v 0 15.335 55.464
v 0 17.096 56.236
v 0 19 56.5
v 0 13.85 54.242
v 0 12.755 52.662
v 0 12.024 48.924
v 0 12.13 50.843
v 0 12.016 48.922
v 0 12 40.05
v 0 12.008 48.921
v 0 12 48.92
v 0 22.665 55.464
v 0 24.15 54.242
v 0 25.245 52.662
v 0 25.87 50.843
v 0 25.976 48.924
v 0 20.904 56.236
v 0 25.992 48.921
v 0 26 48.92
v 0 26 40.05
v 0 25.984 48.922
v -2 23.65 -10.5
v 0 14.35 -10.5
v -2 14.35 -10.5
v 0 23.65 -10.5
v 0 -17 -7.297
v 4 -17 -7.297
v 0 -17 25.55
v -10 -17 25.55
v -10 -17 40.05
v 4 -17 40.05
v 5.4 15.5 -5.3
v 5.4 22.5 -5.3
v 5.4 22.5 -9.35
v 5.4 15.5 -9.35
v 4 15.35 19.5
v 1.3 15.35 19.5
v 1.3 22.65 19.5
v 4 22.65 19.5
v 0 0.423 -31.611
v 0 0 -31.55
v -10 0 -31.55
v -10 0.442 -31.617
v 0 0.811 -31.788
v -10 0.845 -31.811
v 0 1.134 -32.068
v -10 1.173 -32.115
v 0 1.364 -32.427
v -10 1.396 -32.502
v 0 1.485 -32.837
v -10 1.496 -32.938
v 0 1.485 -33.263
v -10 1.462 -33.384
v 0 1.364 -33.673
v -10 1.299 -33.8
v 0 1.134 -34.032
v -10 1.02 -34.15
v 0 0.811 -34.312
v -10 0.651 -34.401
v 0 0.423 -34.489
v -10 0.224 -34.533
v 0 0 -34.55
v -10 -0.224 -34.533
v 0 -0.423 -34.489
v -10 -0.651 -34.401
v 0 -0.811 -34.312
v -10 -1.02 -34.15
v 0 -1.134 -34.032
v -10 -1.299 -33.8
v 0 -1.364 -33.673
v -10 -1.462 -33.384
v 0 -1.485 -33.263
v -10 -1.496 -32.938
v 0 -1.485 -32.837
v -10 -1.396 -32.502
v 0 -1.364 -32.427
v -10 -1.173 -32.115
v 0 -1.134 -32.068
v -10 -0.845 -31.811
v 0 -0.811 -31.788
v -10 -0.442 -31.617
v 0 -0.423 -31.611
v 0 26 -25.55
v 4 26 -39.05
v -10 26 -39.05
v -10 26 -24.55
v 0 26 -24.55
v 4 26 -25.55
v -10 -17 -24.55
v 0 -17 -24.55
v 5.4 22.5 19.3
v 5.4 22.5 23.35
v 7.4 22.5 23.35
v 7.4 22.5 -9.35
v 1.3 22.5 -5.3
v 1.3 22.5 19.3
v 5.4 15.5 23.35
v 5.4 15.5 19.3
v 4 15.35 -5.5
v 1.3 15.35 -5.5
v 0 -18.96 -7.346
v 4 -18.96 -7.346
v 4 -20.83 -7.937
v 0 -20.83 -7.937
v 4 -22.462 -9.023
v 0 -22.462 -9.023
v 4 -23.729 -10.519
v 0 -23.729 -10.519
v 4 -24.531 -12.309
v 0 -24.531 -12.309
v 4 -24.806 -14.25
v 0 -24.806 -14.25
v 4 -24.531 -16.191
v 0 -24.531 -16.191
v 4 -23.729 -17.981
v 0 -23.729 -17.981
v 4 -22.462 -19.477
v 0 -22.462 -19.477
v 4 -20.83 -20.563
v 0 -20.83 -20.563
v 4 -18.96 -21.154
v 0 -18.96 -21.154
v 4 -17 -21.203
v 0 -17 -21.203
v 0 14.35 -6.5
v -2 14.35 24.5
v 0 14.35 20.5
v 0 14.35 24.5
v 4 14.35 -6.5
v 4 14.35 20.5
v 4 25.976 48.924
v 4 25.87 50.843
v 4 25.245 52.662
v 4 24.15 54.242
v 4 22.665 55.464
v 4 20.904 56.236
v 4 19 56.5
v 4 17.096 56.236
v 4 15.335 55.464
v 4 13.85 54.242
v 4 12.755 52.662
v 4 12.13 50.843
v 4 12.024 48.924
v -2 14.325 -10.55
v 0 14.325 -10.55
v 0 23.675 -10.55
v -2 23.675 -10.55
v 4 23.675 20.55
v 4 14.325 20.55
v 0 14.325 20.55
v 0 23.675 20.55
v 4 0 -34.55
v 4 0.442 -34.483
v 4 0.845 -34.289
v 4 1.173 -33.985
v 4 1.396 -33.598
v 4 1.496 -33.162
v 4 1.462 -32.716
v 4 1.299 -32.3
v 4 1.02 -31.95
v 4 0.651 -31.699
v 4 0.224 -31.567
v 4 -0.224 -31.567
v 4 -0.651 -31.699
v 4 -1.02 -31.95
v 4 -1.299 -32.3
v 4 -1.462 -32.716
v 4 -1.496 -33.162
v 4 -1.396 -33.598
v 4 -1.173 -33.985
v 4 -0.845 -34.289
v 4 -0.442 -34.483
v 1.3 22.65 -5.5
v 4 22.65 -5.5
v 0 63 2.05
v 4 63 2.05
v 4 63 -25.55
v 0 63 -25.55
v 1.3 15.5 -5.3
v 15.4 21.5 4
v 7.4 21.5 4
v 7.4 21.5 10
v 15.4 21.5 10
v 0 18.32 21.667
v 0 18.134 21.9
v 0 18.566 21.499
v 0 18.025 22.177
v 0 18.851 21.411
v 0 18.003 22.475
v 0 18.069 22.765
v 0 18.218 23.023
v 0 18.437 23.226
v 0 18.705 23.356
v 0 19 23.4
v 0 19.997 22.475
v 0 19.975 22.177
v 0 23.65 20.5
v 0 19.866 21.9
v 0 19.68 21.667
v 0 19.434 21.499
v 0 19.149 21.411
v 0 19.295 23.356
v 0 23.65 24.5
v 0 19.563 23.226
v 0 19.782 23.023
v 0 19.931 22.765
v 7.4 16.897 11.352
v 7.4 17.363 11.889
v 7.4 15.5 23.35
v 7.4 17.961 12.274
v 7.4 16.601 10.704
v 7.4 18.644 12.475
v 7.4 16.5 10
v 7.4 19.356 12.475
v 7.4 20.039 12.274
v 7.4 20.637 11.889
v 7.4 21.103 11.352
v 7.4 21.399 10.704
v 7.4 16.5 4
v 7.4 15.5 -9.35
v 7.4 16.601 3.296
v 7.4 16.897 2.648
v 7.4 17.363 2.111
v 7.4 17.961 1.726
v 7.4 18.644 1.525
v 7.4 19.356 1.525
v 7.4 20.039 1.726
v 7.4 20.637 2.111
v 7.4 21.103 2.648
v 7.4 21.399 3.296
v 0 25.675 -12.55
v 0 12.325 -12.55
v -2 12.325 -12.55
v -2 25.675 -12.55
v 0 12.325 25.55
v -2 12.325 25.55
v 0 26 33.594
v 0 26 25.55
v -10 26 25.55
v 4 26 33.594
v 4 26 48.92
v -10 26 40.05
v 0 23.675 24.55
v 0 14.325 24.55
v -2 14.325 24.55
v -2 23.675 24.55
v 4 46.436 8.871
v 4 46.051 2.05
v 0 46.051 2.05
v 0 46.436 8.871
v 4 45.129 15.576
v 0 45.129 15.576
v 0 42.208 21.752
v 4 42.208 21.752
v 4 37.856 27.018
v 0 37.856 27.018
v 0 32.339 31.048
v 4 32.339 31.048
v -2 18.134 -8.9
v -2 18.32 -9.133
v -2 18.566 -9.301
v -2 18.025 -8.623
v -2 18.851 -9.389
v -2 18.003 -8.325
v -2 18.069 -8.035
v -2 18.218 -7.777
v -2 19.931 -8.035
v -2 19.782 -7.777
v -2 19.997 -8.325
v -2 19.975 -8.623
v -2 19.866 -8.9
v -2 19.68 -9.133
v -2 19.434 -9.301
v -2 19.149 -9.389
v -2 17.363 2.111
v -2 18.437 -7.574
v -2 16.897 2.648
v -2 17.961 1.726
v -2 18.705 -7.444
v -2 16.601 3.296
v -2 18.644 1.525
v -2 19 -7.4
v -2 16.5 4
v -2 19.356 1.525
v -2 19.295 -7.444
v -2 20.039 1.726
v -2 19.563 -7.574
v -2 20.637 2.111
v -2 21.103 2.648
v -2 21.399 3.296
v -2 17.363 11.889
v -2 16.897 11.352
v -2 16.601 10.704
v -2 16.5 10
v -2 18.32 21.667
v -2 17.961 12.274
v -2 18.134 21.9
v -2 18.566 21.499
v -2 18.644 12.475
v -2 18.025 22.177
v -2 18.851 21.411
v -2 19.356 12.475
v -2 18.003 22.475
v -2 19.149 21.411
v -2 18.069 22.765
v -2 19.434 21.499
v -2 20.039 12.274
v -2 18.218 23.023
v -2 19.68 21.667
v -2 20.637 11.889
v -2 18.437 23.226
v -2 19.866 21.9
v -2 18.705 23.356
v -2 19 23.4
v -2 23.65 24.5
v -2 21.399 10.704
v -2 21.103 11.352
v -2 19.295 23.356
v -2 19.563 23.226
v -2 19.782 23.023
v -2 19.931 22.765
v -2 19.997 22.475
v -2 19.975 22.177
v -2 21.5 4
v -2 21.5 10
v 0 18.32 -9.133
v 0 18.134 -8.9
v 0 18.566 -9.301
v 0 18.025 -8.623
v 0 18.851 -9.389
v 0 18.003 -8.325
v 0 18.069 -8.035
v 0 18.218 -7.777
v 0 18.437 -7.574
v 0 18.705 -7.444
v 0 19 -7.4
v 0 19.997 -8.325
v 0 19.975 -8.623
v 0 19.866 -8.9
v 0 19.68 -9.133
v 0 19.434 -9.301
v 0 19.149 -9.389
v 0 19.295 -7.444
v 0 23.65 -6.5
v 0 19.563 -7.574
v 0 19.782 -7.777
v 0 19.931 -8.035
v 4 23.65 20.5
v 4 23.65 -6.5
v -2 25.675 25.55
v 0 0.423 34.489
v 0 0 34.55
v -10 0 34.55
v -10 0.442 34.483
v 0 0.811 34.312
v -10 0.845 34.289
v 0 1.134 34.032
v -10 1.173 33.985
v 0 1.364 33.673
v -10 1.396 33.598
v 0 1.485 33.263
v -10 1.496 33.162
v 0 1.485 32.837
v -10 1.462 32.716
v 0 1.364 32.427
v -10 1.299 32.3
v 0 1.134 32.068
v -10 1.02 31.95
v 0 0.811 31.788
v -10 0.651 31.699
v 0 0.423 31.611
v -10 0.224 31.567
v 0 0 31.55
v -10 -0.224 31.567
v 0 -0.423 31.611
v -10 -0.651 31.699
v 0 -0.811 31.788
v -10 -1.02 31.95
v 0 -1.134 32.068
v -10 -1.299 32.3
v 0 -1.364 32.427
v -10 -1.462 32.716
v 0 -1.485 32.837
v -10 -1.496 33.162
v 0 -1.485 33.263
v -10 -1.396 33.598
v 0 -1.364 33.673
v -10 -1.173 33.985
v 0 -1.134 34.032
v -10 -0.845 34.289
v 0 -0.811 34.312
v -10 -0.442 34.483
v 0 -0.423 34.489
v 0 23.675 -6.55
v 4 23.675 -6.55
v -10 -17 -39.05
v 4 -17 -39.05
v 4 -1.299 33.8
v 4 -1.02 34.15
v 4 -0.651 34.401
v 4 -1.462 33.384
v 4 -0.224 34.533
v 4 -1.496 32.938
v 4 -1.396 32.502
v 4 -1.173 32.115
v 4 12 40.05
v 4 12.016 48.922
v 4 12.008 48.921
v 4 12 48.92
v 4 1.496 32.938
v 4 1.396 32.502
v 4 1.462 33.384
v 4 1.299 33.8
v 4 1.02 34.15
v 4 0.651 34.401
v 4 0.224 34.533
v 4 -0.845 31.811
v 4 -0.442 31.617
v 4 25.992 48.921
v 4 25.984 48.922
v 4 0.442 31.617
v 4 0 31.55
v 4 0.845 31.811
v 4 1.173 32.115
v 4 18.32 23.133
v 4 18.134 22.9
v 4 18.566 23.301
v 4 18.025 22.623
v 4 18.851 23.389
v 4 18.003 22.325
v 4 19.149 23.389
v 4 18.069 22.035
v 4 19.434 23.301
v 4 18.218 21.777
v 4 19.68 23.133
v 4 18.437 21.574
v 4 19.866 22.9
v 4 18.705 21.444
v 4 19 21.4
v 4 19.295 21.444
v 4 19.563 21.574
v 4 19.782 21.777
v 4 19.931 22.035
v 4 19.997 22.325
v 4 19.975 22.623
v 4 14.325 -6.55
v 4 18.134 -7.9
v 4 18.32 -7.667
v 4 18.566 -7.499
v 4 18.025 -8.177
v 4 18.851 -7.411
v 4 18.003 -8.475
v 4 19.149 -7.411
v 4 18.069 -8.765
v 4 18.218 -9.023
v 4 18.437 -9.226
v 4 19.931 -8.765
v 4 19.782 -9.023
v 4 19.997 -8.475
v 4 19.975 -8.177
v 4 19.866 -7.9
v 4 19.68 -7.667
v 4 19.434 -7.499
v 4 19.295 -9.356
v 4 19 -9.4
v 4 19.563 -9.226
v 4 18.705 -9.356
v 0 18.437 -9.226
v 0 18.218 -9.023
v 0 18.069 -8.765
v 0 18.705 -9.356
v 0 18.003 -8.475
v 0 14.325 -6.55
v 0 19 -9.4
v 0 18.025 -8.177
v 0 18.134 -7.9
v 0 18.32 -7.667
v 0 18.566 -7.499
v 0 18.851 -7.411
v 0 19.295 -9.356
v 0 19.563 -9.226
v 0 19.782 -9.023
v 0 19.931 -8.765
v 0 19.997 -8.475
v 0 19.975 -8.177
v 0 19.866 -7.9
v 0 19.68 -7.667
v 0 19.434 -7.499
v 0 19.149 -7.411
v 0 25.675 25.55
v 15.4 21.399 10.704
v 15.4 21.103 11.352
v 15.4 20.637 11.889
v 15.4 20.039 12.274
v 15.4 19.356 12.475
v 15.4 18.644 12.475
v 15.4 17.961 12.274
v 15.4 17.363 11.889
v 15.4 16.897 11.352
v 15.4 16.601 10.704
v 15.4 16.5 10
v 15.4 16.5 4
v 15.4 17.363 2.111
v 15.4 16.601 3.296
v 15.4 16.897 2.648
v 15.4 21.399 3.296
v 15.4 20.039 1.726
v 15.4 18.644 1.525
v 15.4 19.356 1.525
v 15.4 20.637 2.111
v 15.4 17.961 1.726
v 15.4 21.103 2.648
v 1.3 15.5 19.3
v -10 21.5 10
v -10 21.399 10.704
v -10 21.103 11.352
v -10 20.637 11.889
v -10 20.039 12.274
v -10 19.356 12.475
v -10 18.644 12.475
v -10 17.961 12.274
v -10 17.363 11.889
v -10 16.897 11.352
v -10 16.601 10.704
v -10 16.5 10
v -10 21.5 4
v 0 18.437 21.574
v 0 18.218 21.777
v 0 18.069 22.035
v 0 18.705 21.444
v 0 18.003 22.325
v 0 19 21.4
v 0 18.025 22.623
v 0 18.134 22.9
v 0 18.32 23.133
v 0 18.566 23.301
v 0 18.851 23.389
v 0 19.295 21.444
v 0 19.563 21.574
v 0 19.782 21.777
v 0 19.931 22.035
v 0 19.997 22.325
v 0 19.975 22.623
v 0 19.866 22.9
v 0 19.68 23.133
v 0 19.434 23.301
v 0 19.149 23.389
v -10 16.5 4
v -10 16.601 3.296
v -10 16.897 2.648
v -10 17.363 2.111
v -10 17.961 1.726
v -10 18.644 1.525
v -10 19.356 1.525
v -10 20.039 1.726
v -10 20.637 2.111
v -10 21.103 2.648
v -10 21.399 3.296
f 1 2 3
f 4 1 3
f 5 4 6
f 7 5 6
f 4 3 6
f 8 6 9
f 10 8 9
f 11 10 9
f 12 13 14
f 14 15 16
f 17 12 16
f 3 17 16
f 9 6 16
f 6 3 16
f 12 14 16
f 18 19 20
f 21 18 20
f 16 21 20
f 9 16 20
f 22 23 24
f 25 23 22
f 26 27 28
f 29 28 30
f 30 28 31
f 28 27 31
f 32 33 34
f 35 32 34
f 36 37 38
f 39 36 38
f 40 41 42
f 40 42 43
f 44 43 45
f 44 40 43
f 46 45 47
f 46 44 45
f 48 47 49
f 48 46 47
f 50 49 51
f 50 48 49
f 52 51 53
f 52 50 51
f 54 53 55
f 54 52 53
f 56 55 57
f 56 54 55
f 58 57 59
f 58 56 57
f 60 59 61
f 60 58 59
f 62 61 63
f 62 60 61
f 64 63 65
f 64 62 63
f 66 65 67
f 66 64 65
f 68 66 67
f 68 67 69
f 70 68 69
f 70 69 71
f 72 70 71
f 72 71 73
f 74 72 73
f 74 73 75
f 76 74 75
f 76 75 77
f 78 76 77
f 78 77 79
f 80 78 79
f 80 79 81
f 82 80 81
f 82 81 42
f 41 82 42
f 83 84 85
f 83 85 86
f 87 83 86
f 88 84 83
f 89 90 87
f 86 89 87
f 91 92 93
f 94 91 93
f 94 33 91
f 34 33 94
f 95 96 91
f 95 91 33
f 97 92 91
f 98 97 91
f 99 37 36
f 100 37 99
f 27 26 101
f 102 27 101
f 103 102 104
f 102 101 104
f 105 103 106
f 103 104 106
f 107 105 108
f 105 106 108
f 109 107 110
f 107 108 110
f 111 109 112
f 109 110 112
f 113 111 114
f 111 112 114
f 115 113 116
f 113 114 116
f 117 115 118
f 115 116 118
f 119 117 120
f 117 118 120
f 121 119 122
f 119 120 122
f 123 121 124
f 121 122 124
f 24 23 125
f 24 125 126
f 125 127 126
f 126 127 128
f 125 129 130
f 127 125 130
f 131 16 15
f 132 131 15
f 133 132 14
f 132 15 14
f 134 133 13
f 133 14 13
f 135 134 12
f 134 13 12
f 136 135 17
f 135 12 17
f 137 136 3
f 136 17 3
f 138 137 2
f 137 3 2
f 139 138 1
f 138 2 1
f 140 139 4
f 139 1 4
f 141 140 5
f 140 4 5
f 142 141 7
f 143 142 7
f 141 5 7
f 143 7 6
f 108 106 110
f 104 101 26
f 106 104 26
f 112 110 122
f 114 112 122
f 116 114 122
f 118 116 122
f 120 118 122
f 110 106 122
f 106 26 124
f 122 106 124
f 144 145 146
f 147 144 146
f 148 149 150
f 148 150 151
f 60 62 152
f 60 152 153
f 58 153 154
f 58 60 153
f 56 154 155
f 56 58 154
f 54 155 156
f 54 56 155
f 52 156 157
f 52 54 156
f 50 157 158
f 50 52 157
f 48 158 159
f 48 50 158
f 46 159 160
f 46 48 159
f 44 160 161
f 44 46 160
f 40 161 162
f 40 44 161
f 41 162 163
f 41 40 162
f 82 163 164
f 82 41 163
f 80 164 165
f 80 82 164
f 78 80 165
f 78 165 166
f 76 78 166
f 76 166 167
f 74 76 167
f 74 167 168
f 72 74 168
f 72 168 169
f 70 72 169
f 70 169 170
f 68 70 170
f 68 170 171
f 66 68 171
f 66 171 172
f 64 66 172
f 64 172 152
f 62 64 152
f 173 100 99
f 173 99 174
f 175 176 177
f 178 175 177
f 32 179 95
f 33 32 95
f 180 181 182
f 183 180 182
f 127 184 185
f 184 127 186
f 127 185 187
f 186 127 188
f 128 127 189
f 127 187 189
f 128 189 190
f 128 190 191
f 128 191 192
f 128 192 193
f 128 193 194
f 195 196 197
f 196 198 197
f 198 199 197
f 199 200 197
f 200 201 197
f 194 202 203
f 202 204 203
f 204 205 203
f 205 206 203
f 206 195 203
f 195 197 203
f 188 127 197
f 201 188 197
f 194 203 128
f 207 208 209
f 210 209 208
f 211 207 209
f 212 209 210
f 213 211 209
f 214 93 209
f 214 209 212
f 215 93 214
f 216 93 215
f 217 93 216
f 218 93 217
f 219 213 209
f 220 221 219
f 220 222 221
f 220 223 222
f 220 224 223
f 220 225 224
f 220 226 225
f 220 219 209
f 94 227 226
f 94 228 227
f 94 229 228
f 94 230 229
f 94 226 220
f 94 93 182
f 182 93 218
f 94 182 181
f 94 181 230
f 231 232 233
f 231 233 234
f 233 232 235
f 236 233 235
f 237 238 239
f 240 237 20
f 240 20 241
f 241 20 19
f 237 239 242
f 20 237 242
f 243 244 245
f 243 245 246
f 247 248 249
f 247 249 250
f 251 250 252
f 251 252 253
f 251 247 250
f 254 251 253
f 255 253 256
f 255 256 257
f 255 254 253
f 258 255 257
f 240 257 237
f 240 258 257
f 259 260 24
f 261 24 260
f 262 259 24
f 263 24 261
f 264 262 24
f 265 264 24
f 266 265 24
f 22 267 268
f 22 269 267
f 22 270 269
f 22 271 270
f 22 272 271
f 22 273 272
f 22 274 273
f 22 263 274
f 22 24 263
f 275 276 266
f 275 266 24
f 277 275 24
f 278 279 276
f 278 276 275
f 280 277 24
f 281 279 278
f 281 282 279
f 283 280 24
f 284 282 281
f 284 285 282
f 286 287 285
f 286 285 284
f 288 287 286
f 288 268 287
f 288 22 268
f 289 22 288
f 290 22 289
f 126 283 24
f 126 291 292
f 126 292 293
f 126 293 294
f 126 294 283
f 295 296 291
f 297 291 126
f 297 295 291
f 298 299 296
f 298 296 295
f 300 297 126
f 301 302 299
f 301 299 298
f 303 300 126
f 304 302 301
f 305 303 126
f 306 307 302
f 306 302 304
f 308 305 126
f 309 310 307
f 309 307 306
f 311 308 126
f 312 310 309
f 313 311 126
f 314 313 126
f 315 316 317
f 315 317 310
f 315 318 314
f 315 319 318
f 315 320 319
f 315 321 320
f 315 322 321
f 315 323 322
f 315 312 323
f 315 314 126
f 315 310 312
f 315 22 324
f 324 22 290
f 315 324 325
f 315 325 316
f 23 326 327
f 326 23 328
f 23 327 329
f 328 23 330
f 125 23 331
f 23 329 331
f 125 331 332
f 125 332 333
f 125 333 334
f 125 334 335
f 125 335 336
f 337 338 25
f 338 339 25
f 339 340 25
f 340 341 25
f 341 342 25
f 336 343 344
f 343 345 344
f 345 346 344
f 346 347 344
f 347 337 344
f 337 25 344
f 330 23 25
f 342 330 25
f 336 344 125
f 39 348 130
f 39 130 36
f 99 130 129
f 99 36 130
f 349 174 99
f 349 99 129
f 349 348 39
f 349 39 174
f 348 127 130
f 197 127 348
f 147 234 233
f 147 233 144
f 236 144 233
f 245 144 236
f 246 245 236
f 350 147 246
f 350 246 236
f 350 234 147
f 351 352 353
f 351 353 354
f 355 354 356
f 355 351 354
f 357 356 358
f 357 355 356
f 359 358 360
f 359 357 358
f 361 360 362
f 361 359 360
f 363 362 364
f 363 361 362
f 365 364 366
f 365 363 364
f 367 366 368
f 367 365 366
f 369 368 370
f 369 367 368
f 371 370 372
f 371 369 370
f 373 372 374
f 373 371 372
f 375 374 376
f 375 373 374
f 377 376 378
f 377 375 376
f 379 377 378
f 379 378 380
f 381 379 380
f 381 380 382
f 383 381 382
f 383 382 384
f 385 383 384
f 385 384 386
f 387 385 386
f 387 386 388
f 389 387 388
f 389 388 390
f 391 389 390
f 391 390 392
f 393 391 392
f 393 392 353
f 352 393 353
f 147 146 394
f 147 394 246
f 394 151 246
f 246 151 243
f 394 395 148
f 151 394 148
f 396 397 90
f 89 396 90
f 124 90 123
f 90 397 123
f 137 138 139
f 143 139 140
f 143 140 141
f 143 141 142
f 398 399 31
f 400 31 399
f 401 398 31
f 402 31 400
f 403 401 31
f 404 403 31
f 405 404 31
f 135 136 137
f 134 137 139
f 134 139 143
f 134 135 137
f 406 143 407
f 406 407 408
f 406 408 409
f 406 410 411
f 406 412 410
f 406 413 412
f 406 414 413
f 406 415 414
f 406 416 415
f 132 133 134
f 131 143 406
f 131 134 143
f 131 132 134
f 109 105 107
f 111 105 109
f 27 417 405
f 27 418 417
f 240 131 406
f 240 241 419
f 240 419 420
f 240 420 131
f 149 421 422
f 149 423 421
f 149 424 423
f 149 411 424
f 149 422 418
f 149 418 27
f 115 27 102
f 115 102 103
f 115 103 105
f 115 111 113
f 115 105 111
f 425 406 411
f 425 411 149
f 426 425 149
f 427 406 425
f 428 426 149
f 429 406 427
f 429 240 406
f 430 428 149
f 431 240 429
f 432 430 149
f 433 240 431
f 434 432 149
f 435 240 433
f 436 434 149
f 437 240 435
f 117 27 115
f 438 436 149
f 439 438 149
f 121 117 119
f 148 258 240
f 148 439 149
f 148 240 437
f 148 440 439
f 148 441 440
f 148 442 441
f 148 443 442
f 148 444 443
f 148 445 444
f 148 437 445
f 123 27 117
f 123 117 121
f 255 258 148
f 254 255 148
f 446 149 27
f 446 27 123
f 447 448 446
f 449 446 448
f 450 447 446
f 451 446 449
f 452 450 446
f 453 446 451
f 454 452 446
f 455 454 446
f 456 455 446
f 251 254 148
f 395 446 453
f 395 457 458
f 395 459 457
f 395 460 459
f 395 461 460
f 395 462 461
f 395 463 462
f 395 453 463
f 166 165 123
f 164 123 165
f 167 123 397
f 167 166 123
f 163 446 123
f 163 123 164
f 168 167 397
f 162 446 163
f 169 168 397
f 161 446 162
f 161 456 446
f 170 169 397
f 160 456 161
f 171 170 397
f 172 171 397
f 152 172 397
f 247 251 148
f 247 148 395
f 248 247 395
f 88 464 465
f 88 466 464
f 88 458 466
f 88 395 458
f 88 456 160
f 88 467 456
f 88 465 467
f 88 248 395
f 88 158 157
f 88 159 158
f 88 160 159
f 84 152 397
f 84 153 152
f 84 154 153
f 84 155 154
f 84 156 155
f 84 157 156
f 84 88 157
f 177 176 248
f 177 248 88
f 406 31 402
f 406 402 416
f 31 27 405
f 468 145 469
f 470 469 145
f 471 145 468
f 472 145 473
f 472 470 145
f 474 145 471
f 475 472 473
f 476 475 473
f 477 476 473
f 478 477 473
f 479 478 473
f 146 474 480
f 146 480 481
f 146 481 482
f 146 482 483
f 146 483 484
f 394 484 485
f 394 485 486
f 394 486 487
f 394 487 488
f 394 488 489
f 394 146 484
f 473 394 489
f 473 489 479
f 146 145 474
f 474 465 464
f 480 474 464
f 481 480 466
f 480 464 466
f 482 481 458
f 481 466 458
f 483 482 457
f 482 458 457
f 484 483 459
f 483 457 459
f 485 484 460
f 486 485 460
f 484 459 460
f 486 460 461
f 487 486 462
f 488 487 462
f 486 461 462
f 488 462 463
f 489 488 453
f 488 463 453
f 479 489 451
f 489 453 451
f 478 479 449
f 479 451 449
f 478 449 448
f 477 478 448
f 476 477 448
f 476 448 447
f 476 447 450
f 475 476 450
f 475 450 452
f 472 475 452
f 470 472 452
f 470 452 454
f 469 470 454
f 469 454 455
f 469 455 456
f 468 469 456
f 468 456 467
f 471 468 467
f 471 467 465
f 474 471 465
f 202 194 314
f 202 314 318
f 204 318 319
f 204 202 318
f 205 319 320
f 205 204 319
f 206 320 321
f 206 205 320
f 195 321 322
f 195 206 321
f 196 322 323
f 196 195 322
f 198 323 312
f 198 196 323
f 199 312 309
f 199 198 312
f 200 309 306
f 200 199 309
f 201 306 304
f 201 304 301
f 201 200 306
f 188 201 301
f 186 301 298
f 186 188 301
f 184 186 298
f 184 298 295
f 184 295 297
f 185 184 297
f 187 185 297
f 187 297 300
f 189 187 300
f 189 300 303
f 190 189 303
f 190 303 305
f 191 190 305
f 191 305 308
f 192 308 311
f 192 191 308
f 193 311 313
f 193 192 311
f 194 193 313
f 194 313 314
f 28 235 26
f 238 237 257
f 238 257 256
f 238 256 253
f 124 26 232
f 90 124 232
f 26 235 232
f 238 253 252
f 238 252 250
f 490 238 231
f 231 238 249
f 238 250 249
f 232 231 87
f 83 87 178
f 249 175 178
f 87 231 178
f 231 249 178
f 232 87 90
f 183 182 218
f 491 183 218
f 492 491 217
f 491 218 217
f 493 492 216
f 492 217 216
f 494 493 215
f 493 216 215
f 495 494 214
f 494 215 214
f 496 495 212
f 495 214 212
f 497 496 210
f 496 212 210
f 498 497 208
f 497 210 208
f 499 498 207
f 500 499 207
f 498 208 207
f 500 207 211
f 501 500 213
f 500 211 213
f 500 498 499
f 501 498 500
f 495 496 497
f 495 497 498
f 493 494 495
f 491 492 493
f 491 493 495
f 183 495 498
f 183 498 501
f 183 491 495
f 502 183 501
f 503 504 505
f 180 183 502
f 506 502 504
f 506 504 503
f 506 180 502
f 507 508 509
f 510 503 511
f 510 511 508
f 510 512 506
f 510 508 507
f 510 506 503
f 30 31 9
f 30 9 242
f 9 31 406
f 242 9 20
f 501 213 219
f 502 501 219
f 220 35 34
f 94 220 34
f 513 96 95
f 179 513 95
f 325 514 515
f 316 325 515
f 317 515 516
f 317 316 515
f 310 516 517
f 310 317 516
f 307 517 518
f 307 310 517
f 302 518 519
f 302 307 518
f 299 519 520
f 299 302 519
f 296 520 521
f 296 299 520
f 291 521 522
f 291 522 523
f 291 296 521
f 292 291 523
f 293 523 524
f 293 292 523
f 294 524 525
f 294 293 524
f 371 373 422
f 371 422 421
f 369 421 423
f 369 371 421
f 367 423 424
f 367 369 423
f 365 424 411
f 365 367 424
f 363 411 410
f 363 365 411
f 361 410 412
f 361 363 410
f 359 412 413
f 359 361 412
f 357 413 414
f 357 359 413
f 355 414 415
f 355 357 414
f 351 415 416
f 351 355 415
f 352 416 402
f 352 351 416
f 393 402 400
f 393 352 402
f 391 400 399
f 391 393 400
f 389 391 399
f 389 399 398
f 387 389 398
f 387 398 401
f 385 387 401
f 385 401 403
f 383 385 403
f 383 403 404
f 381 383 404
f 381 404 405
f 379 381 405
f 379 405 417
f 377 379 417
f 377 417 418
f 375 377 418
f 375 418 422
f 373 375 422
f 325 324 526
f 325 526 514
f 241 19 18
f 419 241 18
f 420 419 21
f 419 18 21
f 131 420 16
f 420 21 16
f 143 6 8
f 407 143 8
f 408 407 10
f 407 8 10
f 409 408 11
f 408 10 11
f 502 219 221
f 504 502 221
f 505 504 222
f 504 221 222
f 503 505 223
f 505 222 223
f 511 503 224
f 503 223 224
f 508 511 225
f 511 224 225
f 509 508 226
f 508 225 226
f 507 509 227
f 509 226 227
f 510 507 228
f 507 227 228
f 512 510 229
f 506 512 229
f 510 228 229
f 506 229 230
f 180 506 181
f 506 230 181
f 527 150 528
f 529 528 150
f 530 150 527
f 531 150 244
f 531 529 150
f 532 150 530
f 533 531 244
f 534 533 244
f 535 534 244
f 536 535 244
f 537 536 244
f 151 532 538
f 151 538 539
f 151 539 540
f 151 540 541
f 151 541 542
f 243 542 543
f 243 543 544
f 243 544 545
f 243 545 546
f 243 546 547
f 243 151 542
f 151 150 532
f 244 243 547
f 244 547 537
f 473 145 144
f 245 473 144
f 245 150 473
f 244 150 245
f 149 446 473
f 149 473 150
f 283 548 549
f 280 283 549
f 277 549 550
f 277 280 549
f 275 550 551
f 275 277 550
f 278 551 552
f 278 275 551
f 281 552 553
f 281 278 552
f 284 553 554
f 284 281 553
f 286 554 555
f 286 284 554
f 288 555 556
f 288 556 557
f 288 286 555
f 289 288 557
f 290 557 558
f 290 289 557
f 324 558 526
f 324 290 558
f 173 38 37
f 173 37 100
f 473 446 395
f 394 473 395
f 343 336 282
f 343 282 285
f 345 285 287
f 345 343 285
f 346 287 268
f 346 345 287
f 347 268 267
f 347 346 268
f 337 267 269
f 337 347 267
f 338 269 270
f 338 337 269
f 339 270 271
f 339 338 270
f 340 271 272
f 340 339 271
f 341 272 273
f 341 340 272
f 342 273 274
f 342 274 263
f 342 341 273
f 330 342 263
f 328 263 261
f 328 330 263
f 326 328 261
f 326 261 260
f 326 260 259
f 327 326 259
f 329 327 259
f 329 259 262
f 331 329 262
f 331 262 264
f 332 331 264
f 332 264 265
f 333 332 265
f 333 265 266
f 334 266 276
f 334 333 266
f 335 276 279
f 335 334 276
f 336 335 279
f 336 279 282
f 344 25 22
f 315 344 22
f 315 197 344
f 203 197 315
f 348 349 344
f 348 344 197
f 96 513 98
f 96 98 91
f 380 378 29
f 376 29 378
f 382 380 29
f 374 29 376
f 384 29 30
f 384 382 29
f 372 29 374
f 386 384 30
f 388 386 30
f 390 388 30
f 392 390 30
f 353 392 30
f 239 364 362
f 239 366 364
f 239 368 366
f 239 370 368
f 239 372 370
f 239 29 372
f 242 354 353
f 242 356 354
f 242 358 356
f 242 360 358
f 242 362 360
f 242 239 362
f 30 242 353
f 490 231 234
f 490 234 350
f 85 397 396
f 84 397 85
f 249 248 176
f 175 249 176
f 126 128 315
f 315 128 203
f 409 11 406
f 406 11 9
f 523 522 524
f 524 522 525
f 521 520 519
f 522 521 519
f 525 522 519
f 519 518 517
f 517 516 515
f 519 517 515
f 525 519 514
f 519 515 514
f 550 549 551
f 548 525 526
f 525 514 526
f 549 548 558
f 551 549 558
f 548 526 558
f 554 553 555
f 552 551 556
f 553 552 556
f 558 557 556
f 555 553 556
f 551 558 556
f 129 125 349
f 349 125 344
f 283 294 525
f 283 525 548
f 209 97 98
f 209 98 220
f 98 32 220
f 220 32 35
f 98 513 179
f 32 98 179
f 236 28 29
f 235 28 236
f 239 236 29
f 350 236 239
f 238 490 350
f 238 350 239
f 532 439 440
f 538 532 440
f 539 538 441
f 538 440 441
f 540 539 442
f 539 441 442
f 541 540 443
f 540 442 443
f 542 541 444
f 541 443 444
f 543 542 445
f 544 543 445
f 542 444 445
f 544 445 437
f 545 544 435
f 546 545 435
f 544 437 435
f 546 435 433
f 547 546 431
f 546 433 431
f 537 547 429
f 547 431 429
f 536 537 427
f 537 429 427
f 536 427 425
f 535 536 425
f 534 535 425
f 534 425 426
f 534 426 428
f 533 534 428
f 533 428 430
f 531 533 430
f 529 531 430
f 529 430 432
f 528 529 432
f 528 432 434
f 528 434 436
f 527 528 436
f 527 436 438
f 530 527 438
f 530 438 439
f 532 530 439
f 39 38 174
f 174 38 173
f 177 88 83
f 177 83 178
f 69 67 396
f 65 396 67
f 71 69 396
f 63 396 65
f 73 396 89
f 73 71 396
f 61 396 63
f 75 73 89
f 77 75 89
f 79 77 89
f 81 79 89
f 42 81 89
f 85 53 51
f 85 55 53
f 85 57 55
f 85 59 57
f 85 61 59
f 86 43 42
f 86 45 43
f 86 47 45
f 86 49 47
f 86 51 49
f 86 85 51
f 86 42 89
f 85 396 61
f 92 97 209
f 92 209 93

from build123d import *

# Parameters (mm, degrees)
SKETCH1_R            = 1.5
BOSS_EXTRUDE1_DEPTH  = 4
SKETCH2_W            = 27.1
SKETCH2_H            = 9.35
CUT_EXTRUDE1_DEPTH   = 5
SKETCH3_R            = 1
CUT_EXTRUDE2_DEPTH   = 5
SKETCH4_W            = 14.5
SKETCH4_H            = 43
SKETCH4_R            = 1.5
BOSS_EXTRUDE2_DEPTH  = 10
SKETCH5_W            = 35
SKETCH5_H            = 9.3
SKETCH5_R            = 1
BOSS_EXTRUDE3_DEPTH  = 2
SKETCH6_W            = 27
SKETCH6_H            = 9.3
SKETCH6_W_2          = 25
SKETCH6_H_2          = 7.3
BOSS_EXTRUDE4_DEPTH  = 4
BOSS_EXTRUDE5_DEPTH  = 8
SKETCH8_W            = 39.1
SKETCH8_H            = 13.35
SKETCH8_W_2          = 35.1
SKETCH8_H_2          = 9.35
BOSS_EXTRUDE6_DEPTH  = 2
SKETCH10_W           = 25
SKETCH10_H           = 7.3
BOSS_EXTRUDE7_DEPTH  = 1.3
SKETCH11_W           = 24.6
SKETCH11_H           = 7
BOSS_EXTRUDE8_DEPTH  = 4.1
SKETCH12_W           = 32.7
SKETCH12_H           = 7
BOSS_EXTRUDE9_DEPTH  = 2
BOSS_EXTRUDE10_DEPTH = 8
SKETCH15_W           = 27.6
SKETCH15_H           = 37
BOSS_EXTRUDE11_DEPTH = 4
BOSS_EXTRUDE12_DEPTH = 4
BOSS_EXTRUDE13_START = -4
BOSS_EXTRUDE13_DEPTH = 4


with BuildPart() as part:
    # Sketch1 → Boss-Extrude1 (new body)
    with BuildSketch(Plane(origin=(0, 0, 0), x_dir=(0, 0, -1), z_dir=(1, 0, 0))):
        Polygon((39.05, 17), (39.05, -17), (-40.05, -17), (-40.05, 17), (-40.05, 26), (39.05, 26), align=None)
        with Locations((-33.05, 0)):
            Circle(SKETCH1_R, mode=Mode.SUBTRACT)
        with Locations((33.05, 0)):
            Circle(SKETCH1_R, mode=Mode.SUBTRACT)
    extrude(amount=BOSS_EXTRUDE1_DEPTH)

    # Sketch2 → Cut-Extrude1 (cut, through all)
    with BuildSketch(Plane(origin=(4, 0, 0), x_dir=(0, 0, -1), z_dir=(1, 0, 0))):
        with Locations((-7, 19)):
            Rectangle(SKETCH2_W, SKETCH2_H)
    extrude(amount=-CUT_EXTRUDE1_DEPTH, mode=Mode.SUBTRACT)

    # Sketch3 → Cut-Extrude2 (cut, through all)
    with BuildSketch(Plane(origin=(4, 0, 0), x_dir=(0, 0, -1), z_dir=(1, 0, 0))):
        with Locations((-22.4, 19)):
            Circle(SKETCH3_R)
        with Locations((8.4, 19)):
            Circle(SKETCH3_R)
    extrude(amount=-CUT_EXTRUDE2_DEPTH, mode=Mode.SUBTRACT)

    # Sketch4 → Boss-Extrude2 (add)
    with BuildSketch(Plane.ZY):
        with Locations((-31.8, 4.5)):
            Rectangle(SKETCH4_W, SKETCH4_H)
        with Locations((-33.05, 0)):
            Circle(SKETCH4_R, mode=Mode.SUBTRACT)
        with Locations((32.8, 4.5)):
            Rectangle(SKETCH4_W, SKETCH4_H)
        with Locations((33.05, 0)):
            Circle(SKETCH4_R, mode=Mode.SUBTRACT)
    extrude(amount=BOSS_EXTRUDE2_DEPTH)

    # Sketch8 → Boss-Extrude6 (add)
    with BuildSketch(Plane.ZY):
        with Locations((7, 19)):
            Rectangle(SKETCH8_W, SKETCH8_H)
        with Locations((7, 19)):
            Rectangle(SKETCH8_W_2, SKETCH8_H_2, mode=Mode.SUBTRACT)
    extrude(amount=BOSS_EXTRUDE6_DEPTH)

    # Sketch15 → Boss-Extrude11 (add)
    with BuildSketch(Plane(origin=(4, 0, 0), x_dir=(0, 0, -1), z_dir=(1, 0, 0))):
        with Locations((11.75, 44.5)):
            Rectangle(SKETCH15_W, SKETCH15_H)
    extrude(amount=-BOSS_EXTRUDE11_DEPTH)

    # Sketch16 → Boss-Extrude12 (add)
    with BuildSketch(Plane(origin=(4, 0, 0), x_dir=(0, 0, -1), z_dir=(1, 0, 0))):
        with BuildLine():
            Line((-33.594172294, 26), (-2.05, 26))
            Line((-2.05, 26), (-2.05, 46.05083178))
            ThreePointArc((-2.05, 46.05083178), (-21.75216975, 42.208263349), (-33.594172294, 26))
        make_face()
    extrude(amount=-BOSS_EXTRUDE12_DEPTH)

    # Sketch17 → Boss-Extrude13 (add)
    with BuildSketch(Plane(origin=(4, 0, 0), x_dir=(0, 0, -1), z_dir=(1, 0, 0)).offset(BOSS_EXTRUDE13_START)):
        with BuildLine():
            ThreePointArc((-48.923529412, 25.976222593), (-56.5, 19), (-48.923529412, 12.023777407))
            ThreePointArc((-48.923529412, 12.023777407), (-48.92154931, 12.011888423), (-48.919565837, 12))
            Line((-48.919565837, 12), (-40.05, 12))
            Line((-40.05, 12), (-40.05, 26))
            Line((-40.05, 26), (-48.919565837, 26))
            ThreePointArc((-48.919565837, 26), (-48.92154931, 25.988111577), (-48.923529412, 25.976222593))
        make_face()
        with BuildLine():
            ThreePointArc((7.296566634, -17), (14.25, -24.806079661), (21.203433366, -17))
            Line((21.203433366, -17), (7.296566634, -17))
        make_face()
    extrude(amount=BOSS_EXTRUDE13_DEPTH)


with BuildPart() as body_2:
    # Sketch5 → Boss-Extrude3 (new body)
    with BuildSketch(Plane.ZY):
        with Locations((7, 19)):
            Rectangle(SKETCH5_W, SKETCH5_H)
        with Locations((-8.4, 19)):
            Circle(SKETCH5_R, mode=Mode.SUBTRACT)
        with Locations((22.4, 19)):
            Circle(SKETCH5_R, mode=Mode.SUBTRACT)
    extrude(amount=BOSS_EXTRUDE3_DEPTH)

    # Sketch6 → Boss-Extrude4 (add)
    with BuildSketch(Plane(origin=(0, 0, 0), x_dir=(0, 0, -1), z_dir=(1, 0, 0))):
        with Locations((-7, 19)):
            Rectangle(SKETCH6_W, SKETCH6_H)
        with Locations((-7, 19)):
            Rectangle(SKETCH6_W_2, SKETCH6_H_2, mode=Mode.SUBTRACT)
    extrude(amount=BOSS_EXTRUDE4_DEPTH)

    # Sketch7 → Boss-Extrude5 (add)
    with BuildSketch(Plane.ZY.offset(2)):
        with BuildLine():
            Line((4, 21.5), (10, 21.5))
            ThreePointArc((10, 21.5), (12.5, 19), (10, 16.5))
            Line((10, 16.5), (4, 16.5))
            ThreePointArc((4, 16.5), (1.5, 19), (4, 21.5))
        make_face()
    extrude(amount=BOSS_EXTRUDE5_DEPTH)

    # Sketch10 → Boss-Extrude7 (add)
    with BuildSketch(Plane(origin=(0, 0, 0), x_dir=(0, 0, -1), z_dir=(1, 0, 0))):
        with Locations((-7, 19)):
            Rectangle(SKETCH10_W, SKETCH10_H)
    extrude(amount=BOSS_EXTRUDE7_DEPTH)


with BuildPart() as body_3:
    # Sketch11 → Boss-Extrude8 (new body)
    with BuildSketch(Plane(origin=(1.3, 0, 0), x_dir=(0, 0, -1), z_dir=(1, 0, 0))):
        with Locations((-7, 19)):
            Rectangle(SKETCH11_W, SKETCH11_H)
    extrude(amount=BOSS_EXTRUDE8_DEPTH)

    # Sketch12 → Boss-Extrude9 (add)
    with BuildSketch(Plane(origin=(5.4, 0, 0), x_dir=(0, 0, -1), z_dir=(1, 0, 0))):
        with Locations((-7, 19)):
            Rectangle(SKETCH12_W, SKETCH12_H)
    extrude(amount=BOSS_EXTRUDE9_DEPTH)

    # Sketch13 → Boss-Extrude10 (add)
    with BuildSketch(Plane(origin=(7.4, 0, 0), x_dir=(0, 0, -1), z_dir=(1, 0, 0))):
        with BuildLine():
            Line((-10, 16.5), (-4, 16.5))
            ThreePointArc((-4, 16.5), (-1.5, 19), (-4, 21.5))
            Line((-4, 21.5), (-10, 21.5))
            ThreePointArc((-10, 21.5), (-12.5, 19), (-10, 16.5))
        make_face()
    extrude(amount=BOSS_EXTRUDE10_DEPTH)


solid = Compound([part.part, body_2.part, body_3.part])
